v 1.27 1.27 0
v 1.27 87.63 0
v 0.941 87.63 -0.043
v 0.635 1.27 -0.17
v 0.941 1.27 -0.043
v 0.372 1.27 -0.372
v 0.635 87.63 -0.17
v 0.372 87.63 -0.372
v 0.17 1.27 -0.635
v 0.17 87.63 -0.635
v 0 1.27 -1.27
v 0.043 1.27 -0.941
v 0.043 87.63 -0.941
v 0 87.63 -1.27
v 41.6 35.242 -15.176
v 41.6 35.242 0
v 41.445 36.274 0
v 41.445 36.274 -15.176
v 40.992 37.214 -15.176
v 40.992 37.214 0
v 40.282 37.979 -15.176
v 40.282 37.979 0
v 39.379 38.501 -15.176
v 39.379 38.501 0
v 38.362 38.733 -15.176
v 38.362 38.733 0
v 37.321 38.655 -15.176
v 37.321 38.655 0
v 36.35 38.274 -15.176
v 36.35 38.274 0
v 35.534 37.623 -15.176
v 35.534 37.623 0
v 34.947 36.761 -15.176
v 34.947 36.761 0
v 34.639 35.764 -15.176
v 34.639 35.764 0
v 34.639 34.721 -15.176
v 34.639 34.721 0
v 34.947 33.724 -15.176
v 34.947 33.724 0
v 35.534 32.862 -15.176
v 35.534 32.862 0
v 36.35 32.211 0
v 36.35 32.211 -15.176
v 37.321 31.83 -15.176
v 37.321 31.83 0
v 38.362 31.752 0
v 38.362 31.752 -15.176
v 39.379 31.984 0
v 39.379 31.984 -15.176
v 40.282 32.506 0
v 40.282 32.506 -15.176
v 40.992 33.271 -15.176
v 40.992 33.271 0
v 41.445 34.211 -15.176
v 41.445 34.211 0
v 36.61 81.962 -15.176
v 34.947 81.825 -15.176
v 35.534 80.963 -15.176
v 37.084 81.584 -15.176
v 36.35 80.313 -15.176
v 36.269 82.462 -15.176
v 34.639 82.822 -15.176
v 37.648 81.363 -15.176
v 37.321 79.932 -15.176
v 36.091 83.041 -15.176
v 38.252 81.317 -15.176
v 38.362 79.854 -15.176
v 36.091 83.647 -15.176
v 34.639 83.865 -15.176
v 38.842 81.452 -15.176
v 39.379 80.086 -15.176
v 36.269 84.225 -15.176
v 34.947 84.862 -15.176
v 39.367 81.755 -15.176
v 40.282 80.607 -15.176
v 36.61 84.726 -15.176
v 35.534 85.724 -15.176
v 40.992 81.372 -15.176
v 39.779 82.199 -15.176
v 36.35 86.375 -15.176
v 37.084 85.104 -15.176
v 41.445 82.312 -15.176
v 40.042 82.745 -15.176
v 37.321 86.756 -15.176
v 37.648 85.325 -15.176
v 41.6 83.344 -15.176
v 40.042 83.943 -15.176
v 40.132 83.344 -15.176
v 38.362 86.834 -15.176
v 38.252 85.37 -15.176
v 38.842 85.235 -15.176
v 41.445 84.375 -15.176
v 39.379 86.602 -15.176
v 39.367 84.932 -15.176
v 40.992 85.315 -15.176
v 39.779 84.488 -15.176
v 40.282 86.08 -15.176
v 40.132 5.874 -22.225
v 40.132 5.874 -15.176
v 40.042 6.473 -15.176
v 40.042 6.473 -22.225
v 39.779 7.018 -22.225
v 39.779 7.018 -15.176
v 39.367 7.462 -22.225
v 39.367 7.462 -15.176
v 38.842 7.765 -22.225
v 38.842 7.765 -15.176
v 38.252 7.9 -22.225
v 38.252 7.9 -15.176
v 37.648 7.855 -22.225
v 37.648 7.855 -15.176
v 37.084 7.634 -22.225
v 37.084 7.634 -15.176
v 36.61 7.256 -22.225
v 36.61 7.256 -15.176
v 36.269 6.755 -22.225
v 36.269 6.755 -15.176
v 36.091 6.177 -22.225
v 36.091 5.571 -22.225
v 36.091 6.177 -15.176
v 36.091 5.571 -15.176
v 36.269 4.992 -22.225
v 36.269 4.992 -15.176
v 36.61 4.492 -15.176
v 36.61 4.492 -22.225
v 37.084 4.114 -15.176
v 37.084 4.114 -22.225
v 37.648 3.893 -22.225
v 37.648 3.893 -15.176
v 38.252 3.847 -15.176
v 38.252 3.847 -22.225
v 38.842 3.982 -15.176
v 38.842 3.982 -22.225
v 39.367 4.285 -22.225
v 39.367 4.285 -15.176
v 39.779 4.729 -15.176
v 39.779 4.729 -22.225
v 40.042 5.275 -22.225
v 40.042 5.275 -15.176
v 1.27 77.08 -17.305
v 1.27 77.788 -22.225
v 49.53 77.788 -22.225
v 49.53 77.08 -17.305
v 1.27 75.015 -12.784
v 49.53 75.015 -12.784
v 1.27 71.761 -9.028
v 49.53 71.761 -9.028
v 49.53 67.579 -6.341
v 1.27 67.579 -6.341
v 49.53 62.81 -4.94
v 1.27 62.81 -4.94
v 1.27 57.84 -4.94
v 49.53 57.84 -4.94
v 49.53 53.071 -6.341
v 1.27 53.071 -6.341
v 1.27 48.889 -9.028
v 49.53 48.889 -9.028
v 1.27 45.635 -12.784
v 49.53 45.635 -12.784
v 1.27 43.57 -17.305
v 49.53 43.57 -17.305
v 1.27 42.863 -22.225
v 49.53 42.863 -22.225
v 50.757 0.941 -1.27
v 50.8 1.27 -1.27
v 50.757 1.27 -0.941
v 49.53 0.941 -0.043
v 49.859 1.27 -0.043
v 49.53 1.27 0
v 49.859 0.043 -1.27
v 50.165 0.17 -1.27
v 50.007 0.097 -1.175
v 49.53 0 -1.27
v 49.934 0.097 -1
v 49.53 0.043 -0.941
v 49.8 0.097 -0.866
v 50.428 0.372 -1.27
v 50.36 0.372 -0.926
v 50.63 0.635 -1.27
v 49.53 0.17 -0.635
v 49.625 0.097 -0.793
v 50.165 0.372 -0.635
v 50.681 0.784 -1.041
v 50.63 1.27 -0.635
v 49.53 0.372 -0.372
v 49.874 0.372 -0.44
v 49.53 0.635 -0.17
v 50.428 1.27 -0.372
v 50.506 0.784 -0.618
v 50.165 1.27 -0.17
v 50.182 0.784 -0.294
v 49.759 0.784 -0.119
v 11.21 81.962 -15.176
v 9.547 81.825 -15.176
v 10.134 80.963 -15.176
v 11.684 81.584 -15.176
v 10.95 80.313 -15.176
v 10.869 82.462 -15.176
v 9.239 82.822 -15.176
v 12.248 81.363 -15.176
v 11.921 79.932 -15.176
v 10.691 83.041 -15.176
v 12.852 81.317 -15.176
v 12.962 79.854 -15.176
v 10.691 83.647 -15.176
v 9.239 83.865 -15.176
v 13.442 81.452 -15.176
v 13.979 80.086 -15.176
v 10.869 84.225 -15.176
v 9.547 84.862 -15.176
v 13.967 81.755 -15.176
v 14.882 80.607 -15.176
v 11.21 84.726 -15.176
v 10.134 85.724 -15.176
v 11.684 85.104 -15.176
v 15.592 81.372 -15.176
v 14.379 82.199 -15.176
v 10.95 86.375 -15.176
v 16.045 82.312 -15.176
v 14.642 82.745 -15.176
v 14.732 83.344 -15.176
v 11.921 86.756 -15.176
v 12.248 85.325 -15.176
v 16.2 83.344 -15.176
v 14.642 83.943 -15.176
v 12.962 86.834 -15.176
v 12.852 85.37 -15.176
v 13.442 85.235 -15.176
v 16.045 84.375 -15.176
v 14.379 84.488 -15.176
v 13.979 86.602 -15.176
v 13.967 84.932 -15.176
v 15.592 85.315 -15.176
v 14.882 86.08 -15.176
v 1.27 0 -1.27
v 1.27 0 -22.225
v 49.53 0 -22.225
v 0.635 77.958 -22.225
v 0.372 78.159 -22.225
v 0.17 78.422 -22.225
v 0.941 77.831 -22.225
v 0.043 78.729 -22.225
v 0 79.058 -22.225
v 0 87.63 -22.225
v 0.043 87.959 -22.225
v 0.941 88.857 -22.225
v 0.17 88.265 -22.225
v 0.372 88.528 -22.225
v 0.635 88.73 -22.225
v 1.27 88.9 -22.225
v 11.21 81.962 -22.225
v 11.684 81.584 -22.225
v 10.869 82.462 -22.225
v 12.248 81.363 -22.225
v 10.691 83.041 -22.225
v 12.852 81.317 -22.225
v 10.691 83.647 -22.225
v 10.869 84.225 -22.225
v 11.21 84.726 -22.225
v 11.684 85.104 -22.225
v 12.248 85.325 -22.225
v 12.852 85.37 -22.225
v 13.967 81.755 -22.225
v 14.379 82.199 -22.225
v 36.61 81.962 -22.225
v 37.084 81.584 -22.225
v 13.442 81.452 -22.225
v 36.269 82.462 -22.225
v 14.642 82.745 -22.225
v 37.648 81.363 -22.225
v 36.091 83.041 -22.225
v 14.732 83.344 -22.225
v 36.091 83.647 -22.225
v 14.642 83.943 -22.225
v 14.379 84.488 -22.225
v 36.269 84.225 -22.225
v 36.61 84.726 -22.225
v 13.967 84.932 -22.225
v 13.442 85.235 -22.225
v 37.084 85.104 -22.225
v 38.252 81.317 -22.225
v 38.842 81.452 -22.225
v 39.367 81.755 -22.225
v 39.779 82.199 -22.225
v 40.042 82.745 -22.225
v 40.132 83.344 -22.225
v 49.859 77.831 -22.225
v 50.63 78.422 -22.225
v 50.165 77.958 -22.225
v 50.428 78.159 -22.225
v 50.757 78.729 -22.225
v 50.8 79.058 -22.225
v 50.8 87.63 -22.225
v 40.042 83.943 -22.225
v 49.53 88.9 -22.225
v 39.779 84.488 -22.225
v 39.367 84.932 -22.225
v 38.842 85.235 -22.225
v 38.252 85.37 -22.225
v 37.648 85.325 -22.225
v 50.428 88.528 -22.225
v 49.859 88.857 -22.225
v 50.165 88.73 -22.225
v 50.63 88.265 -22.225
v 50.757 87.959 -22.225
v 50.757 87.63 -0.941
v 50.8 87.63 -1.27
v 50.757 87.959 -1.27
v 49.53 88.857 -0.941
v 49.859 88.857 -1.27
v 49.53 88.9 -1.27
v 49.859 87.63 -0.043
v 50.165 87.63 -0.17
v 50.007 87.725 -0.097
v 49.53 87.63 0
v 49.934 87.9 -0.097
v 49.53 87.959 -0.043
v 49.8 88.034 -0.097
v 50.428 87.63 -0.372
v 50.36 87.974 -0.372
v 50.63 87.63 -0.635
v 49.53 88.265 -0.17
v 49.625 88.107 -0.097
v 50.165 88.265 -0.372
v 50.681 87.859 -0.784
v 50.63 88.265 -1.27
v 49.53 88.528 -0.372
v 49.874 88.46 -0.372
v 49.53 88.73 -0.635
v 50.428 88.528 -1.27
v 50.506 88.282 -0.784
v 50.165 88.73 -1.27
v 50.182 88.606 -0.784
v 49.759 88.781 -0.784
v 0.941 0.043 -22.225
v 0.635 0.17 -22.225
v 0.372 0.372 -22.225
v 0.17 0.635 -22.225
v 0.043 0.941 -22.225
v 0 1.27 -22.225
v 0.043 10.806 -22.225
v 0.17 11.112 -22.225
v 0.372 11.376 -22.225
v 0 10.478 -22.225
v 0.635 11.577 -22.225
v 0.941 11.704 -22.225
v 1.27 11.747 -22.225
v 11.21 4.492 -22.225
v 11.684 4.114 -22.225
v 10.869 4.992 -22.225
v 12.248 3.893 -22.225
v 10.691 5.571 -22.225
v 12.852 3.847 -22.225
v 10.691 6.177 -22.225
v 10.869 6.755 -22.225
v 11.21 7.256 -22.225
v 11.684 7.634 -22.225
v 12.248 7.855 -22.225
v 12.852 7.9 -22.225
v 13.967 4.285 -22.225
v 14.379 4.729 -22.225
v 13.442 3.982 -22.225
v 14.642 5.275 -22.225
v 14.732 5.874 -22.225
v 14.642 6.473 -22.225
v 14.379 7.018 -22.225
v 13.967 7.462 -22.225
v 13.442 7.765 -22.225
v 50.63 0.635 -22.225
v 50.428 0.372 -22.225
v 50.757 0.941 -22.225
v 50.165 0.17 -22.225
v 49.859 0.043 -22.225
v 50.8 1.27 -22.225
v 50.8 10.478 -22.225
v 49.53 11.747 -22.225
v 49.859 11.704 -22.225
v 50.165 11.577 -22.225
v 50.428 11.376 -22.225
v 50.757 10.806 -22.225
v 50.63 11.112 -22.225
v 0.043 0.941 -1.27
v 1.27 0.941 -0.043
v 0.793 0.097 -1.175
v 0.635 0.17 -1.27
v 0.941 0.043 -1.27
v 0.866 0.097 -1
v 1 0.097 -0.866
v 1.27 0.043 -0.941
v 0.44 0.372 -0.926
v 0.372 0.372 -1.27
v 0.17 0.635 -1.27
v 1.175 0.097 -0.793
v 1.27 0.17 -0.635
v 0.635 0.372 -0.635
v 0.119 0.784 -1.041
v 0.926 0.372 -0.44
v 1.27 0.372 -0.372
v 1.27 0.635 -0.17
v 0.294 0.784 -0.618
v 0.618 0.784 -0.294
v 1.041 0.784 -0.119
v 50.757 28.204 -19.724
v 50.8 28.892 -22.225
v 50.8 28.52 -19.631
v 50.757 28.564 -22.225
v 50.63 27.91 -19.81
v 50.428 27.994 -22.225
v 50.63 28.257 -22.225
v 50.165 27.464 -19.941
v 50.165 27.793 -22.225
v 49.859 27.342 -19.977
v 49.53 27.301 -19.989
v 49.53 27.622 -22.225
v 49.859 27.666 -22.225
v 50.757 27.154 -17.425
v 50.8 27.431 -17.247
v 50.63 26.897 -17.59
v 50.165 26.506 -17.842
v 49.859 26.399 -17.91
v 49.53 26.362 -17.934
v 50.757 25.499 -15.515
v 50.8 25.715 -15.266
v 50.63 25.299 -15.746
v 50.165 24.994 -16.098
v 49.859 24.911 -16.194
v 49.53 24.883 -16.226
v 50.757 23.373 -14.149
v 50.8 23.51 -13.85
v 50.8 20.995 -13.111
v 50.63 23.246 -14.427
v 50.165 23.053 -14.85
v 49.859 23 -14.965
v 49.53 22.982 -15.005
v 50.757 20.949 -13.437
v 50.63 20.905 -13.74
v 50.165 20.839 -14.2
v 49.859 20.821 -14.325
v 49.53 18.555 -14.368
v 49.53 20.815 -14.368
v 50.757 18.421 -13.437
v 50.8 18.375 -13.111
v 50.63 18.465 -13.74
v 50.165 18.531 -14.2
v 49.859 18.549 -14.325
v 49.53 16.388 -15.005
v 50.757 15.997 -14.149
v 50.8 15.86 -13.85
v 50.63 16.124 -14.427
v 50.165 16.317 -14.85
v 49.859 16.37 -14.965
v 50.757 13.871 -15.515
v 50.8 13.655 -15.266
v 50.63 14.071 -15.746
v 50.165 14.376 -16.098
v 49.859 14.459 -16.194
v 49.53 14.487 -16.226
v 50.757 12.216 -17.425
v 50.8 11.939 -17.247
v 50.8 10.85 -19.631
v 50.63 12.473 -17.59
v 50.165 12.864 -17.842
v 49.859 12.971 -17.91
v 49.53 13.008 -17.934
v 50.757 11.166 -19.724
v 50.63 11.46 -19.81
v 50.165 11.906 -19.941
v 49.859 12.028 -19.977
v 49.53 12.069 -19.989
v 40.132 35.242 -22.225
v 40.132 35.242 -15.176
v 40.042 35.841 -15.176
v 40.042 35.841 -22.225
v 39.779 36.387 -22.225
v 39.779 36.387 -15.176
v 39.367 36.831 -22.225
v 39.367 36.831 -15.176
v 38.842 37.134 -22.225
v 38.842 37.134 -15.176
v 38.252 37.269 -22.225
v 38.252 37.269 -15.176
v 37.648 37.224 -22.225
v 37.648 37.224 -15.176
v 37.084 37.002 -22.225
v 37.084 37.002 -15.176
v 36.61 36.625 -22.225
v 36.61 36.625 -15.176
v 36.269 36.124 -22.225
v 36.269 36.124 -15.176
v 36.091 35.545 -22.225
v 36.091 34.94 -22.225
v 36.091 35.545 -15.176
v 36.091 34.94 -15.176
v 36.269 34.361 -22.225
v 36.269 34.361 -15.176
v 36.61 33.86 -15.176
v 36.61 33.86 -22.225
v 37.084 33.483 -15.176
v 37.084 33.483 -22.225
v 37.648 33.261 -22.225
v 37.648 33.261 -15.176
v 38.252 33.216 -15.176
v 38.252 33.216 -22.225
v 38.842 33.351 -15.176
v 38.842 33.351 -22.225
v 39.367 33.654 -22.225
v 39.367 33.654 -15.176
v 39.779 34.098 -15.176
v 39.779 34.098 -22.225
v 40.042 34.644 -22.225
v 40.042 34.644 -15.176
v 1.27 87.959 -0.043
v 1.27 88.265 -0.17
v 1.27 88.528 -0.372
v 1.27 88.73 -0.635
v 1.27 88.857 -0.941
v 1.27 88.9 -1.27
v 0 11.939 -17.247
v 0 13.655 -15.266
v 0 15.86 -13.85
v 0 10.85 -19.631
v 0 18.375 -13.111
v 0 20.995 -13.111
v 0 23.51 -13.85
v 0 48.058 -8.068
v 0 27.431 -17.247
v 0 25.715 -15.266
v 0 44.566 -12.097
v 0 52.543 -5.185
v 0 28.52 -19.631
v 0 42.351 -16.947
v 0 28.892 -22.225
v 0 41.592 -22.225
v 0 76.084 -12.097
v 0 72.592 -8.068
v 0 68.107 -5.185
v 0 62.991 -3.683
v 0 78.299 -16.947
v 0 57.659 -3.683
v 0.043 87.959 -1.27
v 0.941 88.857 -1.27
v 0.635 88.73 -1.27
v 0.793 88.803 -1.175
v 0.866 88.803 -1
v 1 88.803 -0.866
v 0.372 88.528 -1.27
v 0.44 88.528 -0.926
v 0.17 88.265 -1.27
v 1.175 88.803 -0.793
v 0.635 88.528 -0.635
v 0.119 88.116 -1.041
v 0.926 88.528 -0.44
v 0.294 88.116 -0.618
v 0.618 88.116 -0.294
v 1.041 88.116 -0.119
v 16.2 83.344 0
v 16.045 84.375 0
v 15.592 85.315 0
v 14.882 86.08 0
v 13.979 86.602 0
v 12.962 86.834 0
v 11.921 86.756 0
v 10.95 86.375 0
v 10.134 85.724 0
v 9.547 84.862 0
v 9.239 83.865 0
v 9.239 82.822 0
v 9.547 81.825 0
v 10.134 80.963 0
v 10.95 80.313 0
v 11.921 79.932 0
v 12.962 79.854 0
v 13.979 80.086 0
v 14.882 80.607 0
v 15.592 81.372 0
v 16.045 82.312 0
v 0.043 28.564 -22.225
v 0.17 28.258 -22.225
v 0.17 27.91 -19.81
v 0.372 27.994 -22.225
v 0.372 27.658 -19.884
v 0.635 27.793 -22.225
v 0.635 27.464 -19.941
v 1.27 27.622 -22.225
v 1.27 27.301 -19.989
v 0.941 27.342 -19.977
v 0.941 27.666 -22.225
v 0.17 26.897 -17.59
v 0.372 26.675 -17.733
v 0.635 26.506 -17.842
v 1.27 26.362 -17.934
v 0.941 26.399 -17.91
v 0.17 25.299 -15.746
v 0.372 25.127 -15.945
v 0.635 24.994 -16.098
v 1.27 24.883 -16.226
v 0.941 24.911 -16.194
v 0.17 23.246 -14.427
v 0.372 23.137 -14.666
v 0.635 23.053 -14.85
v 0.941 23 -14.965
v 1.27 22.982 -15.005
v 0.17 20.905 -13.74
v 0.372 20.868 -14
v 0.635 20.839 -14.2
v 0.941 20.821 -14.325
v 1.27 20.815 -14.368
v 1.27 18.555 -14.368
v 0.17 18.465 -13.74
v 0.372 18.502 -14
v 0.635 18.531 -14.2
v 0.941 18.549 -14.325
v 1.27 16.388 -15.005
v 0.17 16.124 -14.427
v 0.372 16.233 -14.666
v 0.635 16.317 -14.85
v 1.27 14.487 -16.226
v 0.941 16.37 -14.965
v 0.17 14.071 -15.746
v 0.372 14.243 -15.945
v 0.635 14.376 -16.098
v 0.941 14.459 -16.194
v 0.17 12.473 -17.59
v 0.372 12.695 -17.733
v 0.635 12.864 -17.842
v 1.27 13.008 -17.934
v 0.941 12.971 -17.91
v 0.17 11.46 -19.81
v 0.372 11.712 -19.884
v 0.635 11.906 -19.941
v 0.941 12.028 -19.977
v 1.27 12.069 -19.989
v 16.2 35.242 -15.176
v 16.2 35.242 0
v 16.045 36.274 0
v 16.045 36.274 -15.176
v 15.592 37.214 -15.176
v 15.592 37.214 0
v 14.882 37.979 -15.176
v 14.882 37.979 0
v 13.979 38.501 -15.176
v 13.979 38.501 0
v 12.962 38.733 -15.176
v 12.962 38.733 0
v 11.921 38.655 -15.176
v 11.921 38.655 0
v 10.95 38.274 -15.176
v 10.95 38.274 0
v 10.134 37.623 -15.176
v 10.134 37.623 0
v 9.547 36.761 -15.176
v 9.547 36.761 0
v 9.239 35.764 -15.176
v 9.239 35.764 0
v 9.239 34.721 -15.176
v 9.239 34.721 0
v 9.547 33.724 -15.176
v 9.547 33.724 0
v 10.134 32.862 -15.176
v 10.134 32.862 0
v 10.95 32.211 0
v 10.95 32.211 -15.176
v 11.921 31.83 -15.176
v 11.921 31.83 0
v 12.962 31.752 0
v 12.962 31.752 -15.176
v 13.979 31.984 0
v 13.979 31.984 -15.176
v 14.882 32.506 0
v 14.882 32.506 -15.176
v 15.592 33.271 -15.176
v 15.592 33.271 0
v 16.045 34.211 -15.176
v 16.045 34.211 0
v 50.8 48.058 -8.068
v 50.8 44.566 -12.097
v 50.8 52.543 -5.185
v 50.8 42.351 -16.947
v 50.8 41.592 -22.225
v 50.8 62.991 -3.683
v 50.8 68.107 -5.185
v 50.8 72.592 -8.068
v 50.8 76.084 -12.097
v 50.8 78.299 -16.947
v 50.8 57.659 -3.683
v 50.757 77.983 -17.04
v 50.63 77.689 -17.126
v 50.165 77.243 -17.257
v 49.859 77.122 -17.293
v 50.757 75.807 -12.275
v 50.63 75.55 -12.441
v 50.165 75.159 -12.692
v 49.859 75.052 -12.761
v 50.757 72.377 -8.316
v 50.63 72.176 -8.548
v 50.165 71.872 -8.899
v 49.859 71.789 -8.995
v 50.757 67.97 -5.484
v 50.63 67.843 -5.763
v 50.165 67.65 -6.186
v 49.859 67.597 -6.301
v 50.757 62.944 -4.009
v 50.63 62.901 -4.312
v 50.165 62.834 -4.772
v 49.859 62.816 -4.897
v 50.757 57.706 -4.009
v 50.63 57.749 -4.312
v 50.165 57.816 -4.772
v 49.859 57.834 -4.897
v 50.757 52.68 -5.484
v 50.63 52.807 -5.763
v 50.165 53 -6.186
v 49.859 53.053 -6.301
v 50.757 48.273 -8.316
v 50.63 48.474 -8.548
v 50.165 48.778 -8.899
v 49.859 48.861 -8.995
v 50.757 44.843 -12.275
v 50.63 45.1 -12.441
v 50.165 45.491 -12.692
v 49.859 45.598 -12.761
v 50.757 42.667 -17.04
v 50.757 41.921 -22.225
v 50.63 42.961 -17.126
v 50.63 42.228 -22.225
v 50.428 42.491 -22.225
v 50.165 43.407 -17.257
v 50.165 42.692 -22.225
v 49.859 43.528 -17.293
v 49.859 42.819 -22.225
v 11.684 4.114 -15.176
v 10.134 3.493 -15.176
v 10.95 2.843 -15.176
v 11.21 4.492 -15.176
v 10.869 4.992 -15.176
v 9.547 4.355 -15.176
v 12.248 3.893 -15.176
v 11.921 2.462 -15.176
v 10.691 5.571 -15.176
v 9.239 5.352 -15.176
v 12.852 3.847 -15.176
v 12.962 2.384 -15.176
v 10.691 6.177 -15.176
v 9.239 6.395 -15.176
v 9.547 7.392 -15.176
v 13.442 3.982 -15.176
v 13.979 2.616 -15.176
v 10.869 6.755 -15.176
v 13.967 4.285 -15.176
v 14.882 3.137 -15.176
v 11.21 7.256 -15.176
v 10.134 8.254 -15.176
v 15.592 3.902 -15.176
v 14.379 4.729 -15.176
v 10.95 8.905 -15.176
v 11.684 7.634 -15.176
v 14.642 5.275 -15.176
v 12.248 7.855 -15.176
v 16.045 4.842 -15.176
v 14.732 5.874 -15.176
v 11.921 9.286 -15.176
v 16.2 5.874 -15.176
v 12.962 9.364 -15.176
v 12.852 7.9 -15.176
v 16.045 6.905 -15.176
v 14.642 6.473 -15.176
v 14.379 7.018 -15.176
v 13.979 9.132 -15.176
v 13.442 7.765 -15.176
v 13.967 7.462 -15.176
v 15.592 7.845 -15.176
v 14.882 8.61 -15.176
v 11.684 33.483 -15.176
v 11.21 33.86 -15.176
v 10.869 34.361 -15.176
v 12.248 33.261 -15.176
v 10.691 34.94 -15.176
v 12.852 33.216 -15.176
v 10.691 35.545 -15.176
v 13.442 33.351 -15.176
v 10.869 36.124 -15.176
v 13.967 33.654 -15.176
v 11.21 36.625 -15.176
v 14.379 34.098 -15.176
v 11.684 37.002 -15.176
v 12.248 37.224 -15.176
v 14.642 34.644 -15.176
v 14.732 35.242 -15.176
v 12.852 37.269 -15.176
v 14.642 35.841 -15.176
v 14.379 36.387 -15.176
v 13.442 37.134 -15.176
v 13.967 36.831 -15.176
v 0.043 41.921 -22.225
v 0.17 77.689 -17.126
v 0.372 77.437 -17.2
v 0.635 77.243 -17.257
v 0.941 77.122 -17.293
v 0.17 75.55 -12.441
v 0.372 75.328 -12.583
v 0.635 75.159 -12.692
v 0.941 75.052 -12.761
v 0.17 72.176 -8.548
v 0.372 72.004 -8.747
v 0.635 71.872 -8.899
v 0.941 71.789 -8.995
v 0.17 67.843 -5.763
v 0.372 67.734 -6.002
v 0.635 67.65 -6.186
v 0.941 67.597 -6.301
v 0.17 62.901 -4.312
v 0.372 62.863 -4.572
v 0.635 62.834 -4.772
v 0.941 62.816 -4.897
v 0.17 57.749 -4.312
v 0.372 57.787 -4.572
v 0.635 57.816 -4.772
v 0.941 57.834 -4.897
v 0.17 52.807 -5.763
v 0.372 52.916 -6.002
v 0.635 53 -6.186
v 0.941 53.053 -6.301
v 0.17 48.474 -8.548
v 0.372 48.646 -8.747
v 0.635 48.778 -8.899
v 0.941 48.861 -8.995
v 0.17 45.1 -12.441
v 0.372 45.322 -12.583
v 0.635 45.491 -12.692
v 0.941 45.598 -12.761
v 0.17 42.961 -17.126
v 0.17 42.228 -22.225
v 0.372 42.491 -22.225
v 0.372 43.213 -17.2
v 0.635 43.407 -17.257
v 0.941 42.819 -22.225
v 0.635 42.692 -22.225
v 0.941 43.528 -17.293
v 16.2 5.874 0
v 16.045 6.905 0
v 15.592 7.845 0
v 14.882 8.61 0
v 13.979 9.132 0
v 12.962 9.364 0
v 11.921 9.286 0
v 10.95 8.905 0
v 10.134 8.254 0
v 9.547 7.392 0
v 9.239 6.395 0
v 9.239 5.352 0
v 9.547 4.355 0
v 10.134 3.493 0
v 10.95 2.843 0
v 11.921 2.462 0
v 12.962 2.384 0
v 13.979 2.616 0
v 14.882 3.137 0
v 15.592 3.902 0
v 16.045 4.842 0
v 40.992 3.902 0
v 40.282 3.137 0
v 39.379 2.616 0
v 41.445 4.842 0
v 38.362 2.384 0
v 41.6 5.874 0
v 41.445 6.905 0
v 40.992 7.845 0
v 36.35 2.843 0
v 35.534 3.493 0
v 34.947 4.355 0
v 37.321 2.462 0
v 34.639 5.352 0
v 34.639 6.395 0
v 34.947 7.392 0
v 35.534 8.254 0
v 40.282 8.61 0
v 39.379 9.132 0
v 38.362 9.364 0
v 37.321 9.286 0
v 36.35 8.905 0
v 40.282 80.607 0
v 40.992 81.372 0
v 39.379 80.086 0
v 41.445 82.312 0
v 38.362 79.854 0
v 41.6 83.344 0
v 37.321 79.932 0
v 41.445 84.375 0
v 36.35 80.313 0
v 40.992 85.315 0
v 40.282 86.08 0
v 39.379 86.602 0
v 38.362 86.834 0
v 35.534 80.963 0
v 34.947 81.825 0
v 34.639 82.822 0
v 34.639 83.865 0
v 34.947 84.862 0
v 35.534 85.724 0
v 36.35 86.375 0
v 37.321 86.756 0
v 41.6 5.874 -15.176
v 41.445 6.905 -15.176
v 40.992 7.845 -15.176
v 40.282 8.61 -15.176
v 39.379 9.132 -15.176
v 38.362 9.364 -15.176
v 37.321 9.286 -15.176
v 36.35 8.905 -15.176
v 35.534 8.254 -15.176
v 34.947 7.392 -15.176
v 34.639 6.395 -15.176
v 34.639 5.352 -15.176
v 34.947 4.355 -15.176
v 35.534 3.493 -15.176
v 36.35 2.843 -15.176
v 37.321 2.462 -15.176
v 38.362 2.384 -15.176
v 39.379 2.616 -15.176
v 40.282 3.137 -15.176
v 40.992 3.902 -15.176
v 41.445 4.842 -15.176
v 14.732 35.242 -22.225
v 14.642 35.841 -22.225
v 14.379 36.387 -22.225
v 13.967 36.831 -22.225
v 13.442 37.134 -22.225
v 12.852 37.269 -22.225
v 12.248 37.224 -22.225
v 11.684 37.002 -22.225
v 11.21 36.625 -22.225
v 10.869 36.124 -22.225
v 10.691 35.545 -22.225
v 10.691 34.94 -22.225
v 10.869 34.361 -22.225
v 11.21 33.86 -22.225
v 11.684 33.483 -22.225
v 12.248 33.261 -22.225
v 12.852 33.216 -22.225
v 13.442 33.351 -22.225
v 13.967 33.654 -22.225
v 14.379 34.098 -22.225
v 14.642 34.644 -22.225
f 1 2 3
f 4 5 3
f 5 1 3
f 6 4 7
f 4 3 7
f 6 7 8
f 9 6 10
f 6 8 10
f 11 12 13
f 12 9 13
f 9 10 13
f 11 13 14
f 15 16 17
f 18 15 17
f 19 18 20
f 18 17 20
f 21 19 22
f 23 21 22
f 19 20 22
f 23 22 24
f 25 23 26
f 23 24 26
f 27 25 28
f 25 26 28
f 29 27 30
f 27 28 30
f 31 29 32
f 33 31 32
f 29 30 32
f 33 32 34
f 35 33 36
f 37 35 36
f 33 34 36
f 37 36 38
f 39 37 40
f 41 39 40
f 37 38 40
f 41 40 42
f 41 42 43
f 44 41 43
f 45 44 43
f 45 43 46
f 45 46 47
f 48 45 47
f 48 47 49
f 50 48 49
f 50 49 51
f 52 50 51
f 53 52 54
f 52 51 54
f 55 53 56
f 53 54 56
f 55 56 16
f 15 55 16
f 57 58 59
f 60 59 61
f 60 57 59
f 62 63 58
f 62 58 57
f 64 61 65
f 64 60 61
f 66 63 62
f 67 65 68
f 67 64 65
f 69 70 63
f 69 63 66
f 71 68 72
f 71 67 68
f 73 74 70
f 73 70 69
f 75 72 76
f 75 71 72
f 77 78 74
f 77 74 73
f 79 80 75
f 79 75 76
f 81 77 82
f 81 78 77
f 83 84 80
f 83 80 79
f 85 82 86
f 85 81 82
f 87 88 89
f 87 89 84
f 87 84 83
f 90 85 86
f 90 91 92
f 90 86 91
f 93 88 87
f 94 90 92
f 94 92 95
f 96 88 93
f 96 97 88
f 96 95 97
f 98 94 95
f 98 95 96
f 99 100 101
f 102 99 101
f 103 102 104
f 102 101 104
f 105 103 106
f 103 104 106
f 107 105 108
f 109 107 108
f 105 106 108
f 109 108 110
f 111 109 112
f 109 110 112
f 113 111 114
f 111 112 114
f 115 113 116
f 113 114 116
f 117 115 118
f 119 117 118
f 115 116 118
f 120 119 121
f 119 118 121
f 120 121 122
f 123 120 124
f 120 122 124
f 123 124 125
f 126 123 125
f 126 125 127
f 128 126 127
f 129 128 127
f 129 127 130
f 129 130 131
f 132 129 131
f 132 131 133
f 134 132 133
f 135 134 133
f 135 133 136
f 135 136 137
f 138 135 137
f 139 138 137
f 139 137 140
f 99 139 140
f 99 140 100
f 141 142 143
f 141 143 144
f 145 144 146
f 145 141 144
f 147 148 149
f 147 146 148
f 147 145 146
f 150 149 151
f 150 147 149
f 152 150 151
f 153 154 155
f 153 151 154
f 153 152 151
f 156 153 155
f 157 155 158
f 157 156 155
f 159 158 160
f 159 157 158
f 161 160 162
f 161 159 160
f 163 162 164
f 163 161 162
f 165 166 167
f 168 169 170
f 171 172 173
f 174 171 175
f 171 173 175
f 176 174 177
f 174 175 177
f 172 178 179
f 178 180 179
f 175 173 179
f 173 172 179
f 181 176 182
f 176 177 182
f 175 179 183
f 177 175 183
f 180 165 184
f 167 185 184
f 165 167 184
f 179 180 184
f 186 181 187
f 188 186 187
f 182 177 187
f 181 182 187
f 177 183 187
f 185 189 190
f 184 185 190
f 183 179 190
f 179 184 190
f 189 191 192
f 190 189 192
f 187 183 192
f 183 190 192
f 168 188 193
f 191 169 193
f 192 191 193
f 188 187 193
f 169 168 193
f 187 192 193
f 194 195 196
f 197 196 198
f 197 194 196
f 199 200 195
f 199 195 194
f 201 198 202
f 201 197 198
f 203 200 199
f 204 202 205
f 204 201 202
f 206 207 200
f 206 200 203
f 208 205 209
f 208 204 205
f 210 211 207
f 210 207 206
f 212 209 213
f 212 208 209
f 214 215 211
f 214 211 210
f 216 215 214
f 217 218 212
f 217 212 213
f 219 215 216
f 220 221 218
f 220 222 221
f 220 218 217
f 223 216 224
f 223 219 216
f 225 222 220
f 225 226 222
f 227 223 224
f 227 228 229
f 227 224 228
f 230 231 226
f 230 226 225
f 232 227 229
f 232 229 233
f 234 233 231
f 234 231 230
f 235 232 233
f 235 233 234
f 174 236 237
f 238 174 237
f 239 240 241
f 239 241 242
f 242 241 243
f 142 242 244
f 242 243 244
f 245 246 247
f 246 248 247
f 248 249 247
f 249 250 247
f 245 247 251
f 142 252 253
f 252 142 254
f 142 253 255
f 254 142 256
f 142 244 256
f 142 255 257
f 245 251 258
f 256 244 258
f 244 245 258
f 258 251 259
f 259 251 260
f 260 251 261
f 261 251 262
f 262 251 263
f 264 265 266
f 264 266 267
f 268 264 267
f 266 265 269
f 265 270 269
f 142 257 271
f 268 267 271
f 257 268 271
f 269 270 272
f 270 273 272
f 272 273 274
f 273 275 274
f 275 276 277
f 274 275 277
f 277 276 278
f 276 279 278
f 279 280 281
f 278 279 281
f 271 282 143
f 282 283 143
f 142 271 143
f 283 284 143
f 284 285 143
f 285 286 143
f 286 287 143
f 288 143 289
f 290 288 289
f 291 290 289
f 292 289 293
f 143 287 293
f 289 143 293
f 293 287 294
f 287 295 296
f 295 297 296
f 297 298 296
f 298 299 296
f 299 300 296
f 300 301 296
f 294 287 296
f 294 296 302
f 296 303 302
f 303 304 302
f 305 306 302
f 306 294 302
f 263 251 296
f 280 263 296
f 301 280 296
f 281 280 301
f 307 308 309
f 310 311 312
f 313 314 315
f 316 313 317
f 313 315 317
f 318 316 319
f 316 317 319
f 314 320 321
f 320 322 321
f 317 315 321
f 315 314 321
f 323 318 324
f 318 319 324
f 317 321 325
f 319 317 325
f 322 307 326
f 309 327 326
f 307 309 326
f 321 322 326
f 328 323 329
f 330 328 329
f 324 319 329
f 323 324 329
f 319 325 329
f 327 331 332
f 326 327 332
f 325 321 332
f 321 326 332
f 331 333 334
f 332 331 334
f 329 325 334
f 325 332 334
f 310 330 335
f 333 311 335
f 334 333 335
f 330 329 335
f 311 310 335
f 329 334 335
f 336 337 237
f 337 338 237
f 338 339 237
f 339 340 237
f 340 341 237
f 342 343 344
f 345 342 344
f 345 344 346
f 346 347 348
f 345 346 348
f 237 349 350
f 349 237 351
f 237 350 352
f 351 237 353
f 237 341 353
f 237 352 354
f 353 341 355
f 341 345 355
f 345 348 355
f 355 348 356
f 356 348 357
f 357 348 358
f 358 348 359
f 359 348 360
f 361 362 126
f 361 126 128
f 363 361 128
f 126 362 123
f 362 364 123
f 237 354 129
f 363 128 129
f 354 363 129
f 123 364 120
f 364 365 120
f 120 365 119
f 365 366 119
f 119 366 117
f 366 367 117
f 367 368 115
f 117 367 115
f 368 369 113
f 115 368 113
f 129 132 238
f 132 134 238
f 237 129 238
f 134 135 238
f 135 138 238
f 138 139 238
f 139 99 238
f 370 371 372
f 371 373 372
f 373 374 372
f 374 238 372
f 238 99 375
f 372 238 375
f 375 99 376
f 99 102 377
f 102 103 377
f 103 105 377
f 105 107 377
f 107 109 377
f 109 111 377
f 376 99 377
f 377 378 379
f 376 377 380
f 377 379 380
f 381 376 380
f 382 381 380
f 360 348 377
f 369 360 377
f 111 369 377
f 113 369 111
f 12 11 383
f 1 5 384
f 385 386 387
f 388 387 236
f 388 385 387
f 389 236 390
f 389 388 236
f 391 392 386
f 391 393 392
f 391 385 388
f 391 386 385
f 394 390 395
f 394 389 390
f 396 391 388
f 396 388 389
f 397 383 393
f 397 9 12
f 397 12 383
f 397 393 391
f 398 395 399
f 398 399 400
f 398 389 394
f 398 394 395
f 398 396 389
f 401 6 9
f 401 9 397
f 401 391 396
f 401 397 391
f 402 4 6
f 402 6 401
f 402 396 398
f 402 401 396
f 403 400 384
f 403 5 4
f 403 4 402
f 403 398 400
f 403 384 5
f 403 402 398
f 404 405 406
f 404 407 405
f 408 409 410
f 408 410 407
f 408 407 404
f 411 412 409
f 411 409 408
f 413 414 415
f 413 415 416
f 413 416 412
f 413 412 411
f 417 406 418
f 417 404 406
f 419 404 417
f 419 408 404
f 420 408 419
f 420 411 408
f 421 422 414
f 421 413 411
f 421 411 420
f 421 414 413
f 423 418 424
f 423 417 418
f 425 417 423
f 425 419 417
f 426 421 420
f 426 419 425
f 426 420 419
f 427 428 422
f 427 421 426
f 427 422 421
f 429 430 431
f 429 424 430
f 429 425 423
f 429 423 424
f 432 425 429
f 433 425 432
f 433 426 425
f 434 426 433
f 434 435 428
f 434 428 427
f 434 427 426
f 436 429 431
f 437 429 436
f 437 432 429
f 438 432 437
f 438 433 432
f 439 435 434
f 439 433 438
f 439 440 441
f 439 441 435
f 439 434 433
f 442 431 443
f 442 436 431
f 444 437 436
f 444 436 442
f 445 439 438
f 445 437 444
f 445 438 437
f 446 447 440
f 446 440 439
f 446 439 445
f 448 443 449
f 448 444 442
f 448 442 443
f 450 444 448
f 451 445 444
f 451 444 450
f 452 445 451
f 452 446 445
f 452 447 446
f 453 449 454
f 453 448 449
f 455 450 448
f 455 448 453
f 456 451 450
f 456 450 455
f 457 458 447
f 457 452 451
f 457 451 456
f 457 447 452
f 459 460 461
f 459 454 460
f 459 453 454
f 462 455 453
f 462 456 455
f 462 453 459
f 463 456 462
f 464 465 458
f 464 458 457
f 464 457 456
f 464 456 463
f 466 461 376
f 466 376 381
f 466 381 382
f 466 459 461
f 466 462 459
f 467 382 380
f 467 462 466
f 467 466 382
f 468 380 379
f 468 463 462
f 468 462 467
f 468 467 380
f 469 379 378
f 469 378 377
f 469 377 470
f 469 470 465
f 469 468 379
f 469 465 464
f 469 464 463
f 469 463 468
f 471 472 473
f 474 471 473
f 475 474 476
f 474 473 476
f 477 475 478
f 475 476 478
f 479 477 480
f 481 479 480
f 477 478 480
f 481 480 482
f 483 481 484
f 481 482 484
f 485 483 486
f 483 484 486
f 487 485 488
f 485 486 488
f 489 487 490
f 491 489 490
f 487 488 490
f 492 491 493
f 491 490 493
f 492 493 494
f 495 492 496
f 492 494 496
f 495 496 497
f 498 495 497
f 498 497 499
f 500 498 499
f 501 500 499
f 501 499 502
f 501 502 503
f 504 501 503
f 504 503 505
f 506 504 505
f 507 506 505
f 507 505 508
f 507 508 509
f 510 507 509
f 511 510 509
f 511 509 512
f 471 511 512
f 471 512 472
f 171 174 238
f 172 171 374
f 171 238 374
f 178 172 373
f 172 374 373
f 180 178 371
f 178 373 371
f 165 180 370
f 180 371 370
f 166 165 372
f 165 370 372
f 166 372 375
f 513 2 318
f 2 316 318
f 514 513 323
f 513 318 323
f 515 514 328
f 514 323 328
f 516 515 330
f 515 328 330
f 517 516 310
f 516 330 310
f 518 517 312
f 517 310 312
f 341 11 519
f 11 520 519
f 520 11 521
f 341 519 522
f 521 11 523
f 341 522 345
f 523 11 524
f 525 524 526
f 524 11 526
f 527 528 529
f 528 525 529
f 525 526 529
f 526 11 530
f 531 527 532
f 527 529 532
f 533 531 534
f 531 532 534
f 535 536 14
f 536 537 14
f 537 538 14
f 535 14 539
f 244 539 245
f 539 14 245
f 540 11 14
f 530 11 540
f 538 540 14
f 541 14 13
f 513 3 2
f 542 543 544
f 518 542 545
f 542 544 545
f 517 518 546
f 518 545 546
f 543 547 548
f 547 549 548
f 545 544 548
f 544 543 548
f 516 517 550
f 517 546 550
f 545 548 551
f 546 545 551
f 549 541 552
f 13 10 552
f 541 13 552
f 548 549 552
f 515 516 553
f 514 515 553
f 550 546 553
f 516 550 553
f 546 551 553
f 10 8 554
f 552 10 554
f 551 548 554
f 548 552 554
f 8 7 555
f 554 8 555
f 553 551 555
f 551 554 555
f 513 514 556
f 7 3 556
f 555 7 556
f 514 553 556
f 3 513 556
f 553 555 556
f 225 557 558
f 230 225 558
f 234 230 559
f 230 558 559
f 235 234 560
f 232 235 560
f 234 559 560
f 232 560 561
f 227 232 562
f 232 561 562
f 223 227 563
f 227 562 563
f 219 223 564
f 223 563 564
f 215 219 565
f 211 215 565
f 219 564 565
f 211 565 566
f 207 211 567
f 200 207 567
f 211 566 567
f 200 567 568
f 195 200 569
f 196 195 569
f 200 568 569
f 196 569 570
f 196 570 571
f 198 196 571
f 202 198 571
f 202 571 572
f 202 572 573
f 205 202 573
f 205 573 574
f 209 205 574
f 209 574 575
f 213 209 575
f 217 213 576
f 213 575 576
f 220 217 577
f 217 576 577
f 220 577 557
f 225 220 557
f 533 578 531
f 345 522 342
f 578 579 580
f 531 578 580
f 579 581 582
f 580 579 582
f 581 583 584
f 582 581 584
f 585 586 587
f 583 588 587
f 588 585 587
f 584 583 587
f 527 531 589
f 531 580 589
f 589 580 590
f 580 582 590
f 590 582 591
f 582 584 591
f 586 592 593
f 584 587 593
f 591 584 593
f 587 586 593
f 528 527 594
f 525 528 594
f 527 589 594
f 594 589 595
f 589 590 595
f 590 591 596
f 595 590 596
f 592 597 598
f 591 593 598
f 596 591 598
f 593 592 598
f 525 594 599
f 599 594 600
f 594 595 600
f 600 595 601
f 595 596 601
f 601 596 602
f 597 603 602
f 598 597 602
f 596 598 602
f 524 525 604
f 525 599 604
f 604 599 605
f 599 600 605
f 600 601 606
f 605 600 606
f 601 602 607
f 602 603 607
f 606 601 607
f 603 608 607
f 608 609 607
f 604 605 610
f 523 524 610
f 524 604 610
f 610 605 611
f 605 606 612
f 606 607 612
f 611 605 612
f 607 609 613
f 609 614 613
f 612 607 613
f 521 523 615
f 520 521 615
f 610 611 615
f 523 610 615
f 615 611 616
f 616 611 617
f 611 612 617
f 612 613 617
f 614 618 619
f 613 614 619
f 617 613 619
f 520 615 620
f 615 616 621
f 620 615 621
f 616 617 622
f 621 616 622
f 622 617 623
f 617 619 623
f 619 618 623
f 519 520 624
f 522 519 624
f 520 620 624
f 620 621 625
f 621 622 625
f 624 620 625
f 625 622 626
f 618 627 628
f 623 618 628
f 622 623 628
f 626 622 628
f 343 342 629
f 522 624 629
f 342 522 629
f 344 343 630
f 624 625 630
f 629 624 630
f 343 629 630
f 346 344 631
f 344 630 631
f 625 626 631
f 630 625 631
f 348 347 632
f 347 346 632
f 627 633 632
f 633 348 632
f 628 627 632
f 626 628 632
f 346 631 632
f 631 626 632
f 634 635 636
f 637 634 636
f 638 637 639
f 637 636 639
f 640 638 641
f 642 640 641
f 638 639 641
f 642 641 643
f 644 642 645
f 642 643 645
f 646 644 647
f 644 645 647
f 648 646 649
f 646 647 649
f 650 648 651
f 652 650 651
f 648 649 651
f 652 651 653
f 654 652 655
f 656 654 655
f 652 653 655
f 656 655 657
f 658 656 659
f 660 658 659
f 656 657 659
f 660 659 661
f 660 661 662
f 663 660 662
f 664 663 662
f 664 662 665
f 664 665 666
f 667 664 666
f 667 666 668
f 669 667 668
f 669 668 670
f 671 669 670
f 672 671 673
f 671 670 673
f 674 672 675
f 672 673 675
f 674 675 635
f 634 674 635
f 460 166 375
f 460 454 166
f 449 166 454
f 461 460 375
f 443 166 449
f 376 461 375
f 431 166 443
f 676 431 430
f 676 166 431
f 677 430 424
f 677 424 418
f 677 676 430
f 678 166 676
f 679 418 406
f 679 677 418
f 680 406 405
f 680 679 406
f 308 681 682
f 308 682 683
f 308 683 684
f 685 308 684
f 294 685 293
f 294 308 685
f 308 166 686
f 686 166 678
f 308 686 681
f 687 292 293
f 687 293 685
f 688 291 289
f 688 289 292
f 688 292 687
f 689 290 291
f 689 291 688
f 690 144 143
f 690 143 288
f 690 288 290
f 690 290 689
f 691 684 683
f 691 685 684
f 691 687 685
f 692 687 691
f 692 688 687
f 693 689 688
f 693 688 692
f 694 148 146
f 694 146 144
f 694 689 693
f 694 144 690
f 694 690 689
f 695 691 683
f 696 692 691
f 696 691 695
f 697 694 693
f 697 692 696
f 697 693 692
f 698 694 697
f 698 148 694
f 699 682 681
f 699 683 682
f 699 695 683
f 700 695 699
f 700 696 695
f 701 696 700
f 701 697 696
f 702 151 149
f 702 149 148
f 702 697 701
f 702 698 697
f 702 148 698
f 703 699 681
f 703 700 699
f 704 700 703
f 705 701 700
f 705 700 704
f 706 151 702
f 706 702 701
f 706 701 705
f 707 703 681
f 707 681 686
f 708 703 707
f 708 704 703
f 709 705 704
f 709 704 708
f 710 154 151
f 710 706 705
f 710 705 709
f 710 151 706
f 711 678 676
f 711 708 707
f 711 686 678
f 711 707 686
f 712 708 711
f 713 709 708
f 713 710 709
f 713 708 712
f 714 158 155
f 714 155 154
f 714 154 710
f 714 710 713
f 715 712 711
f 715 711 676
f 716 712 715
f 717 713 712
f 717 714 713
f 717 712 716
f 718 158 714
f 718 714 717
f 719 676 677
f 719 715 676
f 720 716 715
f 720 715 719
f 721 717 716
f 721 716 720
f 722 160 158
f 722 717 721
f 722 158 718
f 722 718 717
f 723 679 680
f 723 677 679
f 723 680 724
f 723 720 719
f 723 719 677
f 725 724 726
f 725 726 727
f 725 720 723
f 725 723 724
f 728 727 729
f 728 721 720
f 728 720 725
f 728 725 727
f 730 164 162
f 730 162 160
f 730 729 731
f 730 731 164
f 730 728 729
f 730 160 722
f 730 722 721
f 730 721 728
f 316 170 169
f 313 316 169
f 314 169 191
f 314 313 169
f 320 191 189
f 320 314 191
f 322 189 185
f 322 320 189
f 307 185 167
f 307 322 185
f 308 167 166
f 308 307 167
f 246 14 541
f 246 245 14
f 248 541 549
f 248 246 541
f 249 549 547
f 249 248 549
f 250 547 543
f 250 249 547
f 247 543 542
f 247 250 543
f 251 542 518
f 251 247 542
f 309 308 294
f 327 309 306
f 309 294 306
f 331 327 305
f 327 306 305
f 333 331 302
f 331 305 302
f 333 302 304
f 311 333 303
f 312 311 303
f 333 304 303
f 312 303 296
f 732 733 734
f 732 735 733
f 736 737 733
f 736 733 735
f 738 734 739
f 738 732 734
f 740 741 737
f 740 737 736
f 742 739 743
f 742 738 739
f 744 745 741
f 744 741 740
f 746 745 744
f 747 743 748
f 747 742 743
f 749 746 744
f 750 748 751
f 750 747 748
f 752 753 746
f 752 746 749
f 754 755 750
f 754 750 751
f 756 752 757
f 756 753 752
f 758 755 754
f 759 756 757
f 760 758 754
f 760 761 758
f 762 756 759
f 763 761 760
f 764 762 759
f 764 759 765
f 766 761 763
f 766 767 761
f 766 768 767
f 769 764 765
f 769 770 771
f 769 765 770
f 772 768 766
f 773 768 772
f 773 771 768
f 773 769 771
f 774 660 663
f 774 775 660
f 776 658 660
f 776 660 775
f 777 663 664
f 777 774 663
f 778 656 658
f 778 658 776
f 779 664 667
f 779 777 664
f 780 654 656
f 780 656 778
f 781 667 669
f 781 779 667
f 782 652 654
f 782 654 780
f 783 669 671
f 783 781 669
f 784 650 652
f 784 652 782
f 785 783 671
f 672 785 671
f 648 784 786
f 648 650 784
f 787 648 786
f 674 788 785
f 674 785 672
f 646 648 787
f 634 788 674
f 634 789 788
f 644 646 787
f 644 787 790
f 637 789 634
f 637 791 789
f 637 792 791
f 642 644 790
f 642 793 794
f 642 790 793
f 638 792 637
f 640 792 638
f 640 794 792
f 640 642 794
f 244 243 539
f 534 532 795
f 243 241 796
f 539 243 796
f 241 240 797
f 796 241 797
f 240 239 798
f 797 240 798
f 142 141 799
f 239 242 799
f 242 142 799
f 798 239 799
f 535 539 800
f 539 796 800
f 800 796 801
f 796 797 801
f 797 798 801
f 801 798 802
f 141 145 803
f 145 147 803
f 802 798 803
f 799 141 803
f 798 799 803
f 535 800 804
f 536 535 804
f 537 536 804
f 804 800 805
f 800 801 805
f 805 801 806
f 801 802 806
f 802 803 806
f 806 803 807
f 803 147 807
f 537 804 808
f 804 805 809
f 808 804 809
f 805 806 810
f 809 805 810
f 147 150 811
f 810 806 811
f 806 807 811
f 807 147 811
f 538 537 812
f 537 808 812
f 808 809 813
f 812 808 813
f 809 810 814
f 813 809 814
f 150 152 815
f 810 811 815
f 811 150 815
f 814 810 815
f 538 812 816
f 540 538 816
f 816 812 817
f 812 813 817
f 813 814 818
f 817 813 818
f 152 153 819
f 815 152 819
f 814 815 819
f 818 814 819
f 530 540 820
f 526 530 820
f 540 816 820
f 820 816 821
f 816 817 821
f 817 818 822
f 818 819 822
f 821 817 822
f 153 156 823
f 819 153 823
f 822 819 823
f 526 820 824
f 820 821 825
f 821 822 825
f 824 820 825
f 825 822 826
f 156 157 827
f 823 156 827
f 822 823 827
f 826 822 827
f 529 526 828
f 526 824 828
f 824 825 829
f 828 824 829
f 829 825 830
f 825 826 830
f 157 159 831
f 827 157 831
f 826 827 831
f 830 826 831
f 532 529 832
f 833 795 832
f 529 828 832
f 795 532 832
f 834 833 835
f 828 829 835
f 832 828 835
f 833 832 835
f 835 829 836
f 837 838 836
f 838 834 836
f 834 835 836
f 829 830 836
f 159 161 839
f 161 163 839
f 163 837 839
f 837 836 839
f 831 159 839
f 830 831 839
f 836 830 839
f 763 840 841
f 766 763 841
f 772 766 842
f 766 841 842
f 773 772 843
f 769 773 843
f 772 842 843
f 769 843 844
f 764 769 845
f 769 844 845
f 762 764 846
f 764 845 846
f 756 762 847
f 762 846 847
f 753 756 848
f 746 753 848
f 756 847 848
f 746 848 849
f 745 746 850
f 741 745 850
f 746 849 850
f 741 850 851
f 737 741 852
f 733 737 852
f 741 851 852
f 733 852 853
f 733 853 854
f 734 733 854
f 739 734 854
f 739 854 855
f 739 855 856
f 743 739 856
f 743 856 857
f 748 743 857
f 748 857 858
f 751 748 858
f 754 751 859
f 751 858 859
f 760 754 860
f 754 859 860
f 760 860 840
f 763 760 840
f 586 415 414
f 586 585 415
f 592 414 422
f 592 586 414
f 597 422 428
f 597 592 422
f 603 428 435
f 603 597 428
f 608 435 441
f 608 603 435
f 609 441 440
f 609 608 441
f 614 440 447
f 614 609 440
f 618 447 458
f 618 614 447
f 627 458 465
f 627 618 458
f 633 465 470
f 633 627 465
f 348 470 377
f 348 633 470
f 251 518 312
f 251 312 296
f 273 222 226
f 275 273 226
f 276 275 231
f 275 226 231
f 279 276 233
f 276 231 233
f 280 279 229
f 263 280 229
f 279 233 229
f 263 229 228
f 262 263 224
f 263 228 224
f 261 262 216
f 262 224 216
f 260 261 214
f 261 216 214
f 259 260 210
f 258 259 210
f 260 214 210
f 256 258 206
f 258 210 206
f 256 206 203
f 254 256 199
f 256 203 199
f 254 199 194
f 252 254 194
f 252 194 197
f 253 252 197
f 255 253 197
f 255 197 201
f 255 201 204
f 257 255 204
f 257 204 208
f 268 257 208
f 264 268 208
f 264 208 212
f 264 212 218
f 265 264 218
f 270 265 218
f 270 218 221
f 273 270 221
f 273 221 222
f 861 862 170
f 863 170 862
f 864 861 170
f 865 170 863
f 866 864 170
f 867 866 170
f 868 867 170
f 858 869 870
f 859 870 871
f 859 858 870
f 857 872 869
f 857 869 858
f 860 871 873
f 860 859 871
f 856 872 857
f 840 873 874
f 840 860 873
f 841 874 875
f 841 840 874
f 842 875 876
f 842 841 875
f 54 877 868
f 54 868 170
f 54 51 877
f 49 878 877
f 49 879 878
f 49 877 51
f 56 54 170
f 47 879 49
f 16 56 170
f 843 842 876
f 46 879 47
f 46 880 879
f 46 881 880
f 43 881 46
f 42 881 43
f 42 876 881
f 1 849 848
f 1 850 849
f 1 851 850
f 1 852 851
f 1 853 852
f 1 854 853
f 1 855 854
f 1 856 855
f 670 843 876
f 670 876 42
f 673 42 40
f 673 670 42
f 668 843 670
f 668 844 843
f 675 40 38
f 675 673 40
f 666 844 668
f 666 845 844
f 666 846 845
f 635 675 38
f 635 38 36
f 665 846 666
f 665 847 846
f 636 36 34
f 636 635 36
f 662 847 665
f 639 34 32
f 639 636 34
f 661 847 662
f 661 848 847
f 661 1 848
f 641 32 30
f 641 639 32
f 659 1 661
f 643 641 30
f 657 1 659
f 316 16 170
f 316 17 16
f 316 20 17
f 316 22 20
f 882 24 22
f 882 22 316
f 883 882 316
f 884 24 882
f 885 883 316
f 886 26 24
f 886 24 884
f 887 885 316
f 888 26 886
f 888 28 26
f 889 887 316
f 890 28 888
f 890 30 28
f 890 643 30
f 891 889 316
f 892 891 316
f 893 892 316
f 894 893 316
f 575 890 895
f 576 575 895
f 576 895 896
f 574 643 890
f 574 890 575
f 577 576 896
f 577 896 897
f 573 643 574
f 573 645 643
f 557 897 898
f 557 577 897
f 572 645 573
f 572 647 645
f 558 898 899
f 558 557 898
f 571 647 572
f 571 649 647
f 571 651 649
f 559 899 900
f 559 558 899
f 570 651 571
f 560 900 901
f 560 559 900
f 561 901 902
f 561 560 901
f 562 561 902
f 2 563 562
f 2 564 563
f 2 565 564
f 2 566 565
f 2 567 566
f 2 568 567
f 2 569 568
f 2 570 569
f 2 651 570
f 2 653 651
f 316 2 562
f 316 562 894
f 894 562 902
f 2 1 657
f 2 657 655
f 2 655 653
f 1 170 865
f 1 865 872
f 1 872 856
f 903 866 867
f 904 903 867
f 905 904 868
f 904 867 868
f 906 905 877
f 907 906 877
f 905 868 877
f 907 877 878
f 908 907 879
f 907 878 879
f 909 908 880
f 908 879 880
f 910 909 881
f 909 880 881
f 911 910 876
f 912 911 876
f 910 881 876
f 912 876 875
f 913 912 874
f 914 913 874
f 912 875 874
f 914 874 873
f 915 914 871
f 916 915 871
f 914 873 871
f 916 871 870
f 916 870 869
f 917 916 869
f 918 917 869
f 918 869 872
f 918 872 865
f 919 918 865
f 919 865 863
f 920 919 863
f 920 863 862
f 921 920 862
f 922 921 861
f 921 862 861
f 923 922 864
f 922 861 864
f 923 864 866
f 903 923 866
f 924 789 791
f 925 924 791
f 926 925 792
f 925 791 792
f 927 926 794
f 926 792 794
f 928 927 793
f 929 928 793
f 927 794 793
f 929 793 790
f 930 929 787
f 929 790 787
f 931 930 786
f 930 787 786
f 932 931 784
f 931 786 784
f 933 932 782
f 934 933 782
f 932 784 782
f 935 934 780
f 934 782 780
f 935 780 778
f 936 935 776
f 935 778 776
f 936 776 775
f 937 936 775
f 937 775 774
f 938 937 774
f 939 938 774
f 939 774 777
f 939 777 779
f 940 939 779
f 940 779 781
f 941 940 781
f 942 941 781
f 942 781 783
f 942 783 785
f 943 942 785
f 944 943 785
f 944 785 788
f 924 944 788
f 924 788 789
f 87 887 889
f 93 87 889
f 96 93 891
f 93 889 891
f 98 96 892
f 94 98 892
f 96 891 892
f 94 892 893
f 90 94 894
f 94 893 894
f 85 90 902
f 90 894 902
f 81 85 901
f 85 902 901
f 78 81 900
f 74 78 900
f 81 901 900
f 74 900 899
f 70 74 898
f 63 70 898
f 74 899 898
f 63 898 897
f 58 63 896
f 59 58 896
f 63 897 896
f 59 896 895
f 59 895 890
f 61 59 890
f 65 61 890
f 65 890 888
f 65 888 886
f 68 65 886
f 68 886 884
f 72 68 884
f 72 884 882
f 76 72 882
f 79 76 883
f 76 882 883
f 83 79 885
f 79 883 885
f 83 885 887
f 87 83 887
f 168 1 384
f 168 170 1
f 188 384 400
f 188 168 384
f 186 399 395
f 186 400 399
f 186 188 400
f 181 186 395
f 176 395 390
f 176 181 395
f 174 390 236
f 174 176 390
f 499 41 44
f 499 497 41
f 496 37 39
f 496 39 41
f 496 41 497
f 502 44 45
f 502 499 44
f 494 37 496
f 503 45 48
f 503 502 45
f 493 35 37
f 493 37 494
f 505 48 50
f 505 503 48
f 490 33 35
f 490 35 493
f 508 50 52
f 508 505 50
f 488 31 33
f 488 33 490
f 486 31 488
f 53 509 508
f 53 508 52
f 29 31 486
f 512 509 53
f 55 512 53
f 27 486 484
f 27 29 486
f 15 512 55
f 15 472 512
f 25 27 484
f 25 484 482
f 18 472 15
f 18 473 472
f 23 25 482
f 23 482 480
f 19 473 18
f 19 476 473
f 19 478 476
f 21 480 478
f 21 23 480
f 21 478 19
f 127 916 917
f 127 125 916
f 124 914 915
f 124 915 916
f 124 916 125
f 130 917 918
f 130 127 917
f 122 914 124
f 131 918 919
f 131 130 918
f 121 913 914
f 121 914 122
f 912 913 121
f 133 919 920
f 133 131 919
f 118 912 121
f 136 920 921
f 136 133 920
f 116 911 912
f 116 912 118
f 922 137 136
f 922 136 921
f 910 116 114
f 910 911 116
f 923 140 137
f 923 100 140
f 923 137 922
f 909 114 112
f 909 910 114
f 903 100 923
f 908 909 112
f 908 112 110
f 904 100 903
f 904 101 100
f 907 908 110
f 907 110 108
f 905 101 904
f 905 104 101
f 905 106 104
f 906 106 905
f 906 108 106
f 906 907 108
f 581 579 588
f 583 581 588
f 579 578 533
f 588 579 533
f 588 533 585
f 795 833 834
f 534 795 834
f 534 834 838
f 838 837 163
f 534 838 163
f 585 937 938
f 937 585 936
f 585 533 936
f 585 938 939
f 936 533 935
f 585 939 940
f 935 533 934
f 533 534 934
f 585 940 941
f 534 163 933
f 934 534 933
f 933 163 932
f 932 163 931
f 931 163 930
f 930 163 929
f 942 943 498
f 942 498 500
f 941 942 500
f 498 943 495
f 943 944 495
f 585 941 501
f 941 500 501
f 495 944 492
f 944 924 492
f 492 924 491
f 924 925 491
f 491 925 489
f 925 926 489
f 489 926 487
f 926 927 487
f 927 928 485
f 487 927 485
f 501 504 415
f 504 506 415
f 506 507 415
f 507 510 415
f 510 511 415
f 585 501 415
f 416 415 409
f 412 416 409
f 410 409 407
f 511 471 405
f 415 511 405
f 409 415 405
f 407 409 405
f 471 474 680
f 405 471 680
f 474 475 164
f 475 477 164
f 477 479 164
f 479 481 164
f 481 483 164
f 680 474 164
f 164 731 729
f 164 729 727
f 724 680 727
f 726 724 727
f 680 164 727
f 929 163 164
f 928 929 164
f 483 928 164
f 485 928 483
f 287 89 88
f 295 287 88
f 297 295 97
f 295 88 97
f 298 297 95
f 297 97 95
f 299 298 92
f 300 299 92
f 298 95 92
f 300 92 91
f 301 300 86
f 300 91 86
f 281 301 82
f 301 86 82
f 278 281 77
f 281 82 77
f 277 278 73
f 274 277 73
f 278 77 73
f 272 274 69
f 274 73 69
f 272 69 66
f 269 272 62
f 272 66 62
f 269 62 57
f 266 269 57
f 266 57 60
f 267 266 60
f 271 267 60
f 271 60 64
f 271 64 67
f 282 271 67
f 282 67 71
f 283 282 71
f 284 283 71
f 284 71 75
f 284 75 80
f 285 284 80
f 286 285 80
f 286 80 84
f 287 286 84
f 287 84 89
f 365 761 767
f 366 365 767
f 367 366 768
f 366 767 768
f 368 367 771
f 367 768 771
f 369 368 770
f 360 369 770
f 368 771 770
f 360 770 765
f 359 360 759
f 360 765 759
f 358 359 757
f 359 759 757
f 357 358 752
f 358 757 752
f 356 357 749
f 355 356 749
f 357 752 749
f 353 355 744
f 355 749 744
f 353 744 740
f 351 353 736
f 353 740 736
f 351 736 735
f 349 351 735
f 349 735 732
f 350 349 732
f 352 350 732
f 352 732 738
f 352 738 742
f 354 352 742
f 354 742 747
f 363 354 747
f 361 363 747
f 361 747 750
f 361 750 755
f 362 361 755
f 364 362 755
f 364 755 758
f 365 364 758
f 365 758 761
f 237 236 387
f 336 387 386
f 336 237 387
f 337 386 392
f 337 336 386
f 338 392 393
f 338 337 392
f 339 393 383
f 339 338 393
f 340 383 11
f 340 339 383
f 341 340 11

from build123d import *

# Parameters (mm, degrees)
SKETCH1_W           = 44.45
SKETCH1_H           = 88.9
SKETCH1_R           = 7.9375
SKETCH1_R_2         = 17.4625
BOSS_EXTRUDE1_DEPTH = 50.8
SKETCH5_R           = 2.032
CUT_EXTRUDE1_DEPTH  = 112.622813528
SKETCH5_3_R         = 3.5
CUT_EXTRUDE2_DEPTH  = 15.1765
CUT_EXTRUDE3_DEPTH  = 2.54
FILLET1_R           = 1.27


with BuildPart() as part:
    # Sketch1 → Boss-Extrude1 (new body)
    with BuildSketch(Plane(origin=(0, 0, 0), x_dir=(0, 0, -1), z_dir=(1, 0, 0))):
        with Locations((22.225, 44.45)):
            Rectangle(SKETCH1_W, SKETCH1_H)
        with Locations(Location((22.225, 19.685, 0), (0, 0, 180))):
            Circle(SKETCH1_R, mode=Mode.SUBTRACT)
        with Locations(Location((22.225, 60.325, 0), (0, 0, 180))):
            Circle(SKETCH1_R_2, mode=Mode.SUBTRACT)
    extrude(amount=BOSS_EXTRUDE1_DEPTH)

    # Sketch5 → Cut-Extrude1 (cut, through all)
    with BuildSketch(Plane.XY):
        with Locations((12.7, 83.34375)):
            Circle(SKETCH5_R)
        with Locations((12.7, 35.2425)):
            Circle(SKETCH5_R)
        with Locations((38.1, 83.34375)):
            Circle(SKETCH5_R)
        with Locations((38.1, 35.2425)):
            Circle(SKETCH5_R)
        with Locations((12.7, 5.87375)):
            Circle(SKETCH5_R)
        with Locations((38.1, 5.87375)):
            Circle(SKETCH5_R)
    extrude(amount=-CUT_EXTRUDE1_DEPTH, mode=Mode.SUBTRACT)

    # Sketch5<3> → Cut-Extrude2 (cut)
    with BuildSketch(Plane.XY):
        with Locations((38.1, 35.2425)):
            Circle(SKETCH5_3_R)
        with Locations((12.7, 83.34375)):
            Circle(SKETCH5_3_R)
        with Locations((38.1, 83.34375)):
            Circle(SKETCH5_3_R)
        with Locations((12.7, 35.2425)):
            Circle(SKETCH5_3_R)
        with Locations((38.1, 5.87375)):
            Circle(SKETCH5_3_R)
        with Locations((12.7, 5.87375)):
            Circle(SKETCH5_3_R)
    extrude(amount=-CUT_EXTRUDE2_DEPTH, mode=Mode.SUBTRACT)

    # Sketch6 → Cut-Extrude3 (cut)
    with BuildSketch(Plane(origin=(0, 0, -44.45), x_dir=(-1, 0, 0), z_dir=(0, 0, -1))):
        Polygon((-8.636, 83.34375), (-10.668, 86.863277241), (-14.732, 86.863277241), (-16.764, 83.34375), (-14.732, 79.824222759), (-10.668, 79.824222759), align=None)
        Polygon((-34.036, 83.34375), (-36.068, 86.863277241), (-40.132, 86.863277241), (-42.164, 83.34375), (-40.132, 79.824222759), (-36.068, 79.824222759), align=None)
        Polygon((-34.036, 35.2425), (-36.068, 38.762027241), (-40.132, 38.762027241), (-42.164, 35.2425), (-40.132, 31.722972759), (-36.068, 31.722972759), align=None)
        Polygon((-8.636, 35.2425), (-10.668, 38.762027241), (-14.732, 38.762027241), (-16.764, 35.2425), (-14.732, 31.722972759), (-10.668, 31.722972759), align=None)
        Polygon((-8.636, 5.87375), (-10.668, 9.393277241), (-14.732, 9.393277241), (-16.764, 5.87375), (-14.732, 2.354222759), (-10.668, 2.354222759), align=None)
        Polygon((-34.036, 5.87375), (-36.068, 9.393277241), (-40.132, 9.393277241), (-42.164, 5.87375), (-40.132, 2.354222759), (-36.068, 2.354222759), align=None)
    extrude(amount=-CUT_EXTRUDE3_DEPTH, mode=Mode.SUBTRACT)

    # Fillet1
    fillet1_edges = [part.edges().sort_by_distance(p)[0] for p in [
        (0, 60.325, -39.6875),
        (50.8, 60.325, -39.6875),
        (50.8, 88.9, -22.225),
        (0, 19.685, -30.1625),
        (50.8, 19.685, -30.1625),
        (50.8, 44.45, 0),
        (50.8, 0, -22.225),
        (0, 44.45, 0),
        (0, 88.9, -22.225),
        (0, 44.45, -44.45),
        (0, 0, -22.225),
        (25.4, 0, 0),
        (25.4, 88.9, 0),
        (25.4, 88.9, -44.45),
        (25.4, 0, -44.45),
        (50.8, 44.45, -44.45),
    ]]
    fillet(fillet1_edges, radius=FILLET1_R)

    # SurfaceCut1
    split(bisect_by=Plane.XY.offset(-22.225), keep=Keep.TOP)


solid = part.part
